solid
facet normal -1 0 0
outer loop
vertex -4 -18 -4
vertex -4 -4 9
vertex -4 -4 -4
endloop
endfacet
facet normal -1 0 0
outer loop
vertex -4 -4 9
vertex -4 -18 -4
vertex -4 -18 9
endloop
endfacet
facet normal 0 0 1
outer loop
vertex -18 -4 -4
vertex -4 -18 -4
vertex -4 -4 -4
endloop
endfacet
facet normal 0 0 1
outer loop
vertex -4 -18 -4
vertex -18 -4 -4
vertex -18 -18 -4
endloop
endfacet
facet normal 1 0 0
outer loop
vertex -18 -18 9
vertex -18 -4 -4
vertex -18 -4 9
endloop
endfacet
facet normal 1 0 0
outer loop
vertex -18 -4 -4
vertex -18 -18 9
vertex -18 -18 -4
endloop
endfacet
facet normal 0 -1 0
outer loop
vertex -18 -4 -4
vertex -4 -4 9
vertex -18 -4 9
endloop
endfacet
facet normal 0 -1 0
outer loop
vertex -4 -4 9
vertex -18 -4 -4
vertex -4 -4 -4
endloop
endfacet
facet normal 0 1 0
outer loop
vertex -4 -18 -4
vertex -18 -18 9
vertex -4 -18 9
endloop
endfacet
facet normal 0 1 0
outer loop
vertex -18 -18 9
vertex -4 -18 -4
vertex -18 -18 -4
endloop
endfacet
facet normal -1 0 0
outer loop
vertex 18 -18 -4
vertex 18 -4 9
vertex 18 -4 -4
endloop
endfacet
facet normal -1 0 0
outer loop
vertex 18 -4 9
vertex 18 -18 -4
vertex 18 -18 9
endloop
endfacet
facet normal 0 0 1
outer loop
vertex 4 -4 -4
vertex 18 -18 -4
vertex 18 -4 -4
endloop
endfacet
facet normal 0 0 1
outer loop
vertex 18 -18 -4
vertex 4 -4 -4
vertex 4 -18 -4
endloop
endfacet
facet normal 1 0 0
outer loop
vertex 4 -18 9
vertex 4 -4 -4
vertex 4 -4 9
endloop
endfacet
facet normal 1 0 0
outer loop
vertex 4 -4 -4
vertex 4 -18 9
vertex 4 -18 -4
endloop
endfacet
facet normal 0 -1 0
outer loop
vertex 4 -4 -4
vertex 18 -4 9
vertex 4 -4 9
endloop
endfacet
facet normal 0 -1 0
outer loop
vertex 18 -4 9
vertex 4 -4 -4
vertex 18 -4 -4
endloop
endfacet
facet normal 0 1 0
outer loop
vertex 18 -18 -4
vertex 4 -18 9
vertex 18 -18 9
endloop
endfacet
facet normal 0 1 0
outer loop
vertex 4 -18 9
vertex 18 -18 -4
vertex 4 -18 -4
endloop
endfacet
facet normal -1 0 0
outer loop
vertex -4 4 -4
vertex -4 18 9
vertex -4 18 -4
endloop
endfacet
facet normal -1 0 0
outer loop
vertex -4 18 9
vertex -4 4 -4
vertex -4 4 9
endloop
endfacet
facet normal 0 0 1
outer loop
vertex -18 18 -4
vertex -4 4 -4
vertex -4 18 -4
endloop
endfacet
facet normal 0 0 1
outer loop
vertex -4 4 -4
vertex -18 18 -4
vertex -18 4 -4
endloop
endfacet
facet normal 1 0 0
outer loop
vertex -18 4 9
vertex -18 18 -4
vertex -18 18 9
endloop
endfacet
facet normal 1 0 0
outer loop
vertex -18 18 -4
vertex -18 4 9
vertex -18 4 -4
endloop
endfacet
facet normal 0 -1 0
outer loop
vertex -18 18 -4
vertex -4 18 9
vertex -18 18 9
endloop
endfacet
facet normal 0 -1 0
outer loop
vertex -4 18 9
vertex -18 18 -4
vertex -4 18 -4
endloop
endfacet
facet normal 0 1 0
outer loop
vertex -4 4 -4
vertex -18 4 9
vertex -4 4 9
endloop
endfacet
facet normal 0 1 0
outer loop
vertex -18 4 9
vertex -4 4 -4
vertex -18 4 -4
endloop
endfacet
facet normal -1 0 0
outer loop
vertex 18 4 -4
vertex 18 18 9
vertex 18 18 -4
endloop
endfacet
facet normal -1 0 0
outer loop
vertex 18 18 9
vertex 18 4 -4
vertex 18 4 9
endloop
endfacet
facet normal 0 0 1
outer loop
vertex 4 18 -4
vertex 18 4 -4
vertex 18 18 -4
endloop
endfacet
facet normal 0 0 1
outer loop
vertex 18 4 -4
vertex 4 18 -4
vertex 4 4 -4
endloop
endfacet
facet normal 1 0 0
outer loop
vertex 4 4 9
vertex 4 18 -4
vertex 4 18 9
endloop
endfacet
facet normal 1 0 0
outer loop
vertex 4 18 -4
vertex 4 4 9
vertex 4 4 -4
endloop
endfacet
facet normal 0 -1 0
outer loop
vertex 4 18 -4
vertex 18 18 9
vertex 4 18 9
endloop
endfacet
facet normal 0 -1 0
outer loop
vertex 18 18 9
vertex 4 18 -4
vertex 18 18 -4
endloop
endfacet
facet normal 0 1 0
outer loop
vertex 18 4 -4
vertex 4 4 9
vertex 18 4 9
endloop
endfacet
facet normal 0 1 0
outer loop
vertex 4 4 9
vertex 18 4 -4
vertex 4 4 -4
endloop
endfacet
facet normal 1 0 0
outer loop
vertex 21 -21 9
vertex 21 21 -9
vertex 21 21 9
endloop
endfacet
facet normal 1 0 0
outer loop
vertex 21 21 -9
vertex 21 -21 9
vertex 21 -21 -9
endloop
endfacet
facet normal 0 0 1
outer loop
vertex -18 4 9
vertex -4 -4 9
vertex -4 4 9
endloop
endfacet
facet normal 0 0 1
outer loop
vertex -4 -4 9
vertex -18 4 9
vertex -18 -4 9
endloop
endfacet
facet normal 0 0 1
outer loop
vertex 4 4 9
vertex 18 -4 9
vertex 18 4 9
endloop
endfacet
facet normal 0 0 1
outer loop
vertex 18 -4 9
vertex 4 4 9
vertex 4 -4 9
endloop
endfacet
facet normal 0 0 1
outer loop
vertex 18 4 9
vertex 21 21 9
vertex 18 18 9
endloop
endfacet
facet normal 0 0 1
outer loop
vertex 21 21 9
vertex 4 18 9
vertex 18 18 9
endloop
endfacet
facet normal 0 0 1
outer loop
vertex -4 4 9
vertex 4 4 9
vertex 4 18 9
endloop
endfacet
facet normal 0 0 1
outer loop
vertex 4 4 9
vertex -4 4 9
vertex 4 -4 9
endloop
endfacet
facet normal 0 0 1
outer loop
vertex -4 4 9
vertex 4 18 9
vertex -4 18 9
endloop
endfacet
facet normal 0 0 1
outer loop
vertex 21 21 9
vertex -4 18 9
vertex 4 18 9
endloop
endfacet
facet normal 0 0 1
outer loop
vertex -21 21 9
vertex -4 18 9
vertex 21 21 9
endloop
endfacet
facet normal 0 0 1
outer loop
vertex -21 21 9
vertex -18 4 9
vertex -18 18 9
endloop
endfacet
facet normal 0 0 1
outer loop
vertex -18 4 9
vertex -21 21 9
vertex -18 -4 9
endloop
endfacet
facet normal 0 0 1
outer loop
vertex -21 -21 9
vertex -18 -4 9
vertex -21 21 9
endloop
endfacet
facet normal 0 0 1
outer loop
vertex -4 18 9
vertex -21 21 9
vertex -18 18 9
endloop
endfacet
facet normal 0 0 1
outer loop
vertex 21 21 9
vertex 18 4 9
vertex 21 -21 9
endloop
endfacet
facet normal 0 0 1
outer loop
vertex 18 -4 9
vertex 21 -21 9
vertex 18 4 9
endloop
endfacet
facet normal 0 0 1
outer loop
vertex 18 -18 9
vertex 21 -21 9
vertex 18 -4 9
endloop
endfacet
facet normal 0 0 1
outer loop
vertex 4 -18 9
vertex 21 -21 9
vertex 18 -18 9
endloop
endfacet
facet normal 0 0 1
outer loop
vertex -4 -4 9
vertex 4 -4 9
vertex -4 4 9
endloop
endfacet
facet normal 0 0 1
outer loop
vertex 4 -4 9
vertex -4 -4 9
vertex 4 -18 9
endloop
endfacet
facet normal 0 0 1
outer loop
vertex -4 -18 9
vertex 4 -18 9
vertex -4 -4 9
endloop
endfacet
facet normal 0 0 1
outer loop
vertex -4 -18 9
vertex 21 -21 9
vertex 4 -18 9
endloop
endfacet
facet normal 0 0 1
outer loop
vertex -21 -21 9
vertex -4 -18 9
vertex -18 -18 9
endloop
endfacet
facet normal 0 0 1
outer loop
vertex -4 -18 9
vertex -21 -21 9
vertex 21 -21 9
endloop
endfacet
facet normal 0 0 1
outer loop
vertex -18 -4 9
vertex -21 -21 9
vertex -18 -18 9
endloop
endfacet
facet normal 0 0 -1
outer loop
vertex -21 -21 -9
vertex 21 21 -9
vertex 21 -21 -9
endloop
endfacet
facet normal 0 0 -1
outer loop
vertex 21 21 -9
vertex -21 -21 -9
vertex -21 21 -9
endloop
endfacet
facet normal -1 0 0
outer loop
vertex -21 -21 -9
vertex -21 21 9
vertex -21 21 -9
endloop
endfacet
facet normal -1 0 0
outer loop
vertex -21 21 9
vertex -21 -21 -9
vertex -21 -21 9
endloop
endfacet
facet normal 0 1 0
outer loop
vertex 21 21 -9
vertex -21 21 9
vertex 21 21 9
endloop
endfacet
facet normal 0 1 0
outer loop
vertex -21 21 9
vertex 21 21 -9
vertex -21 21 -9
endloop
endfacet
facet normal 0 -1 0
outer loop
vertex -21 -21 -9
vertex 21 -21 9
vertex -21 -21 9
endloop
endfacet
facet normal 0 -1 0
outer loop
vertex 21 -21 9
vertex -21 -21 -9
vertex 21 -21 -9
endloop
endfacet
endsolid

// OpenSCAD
$fn = 32;

// ----------------------------------------------------------------------
// Pocket plate 42 x 42 x 18
// 2 x 2 pockets 14 mm square, 13 mm deep
// ----------------------------------------------------------------------

// --- parameters (mm) ---
thickness = 18;  // plate thickness
floor_t = 5;     // material left under each pocket
pocket = 14;     // pocket side length
pitch_x = 22;    // pocket pitch along X
pitch_y = 22;    // pocket pitch along Y
cols = 2;        // pockets per row
rows = 2;        // rows of pockets

// --- derived feature positions (mm) ---
depth = thickness - floor_t;        // = 13   pocket depth, down to the floor
span_x = (cols - 1) * pitch_x;      // = 22   distance between outer pockets
span_y = (rows - 1) * pitch_y;      // = 22   distance between outer pocket rows
origin_x = -span_x / 2;             // = -11   X of the first pocket
origin_y = -span_y / 2;             // = -11   Y of the first pocket
plate = [span_x + pocket + 6, span_y + pocket + 6, thickness];  // = [42, 42, 18]   overall size: pockets plus 3 mm of wall on each side
feature_centers = [
  [origin_x + 0 * pitch_x, origin_y + 0 * pitch_y],
  [origin_x + 1 * pitch_x, origin_y + 0 * pitch_y],
  [origin_x + 0 * pitch_x, origin_y + 1 * pitch_y],
  [origin_x + 1 * pitch_x, origin_y + 1 * pitch_y]
];   // pocket centres, used verbatim by the cutter loop

// plate outline, then one pocket per centre in feature_centers
difference() {
  cube(plate, center = true);
  for (centre = feature_centers)
    translate([centre[0] - pocket / 2, centre[1] - pocket / 2, plate[2] / 2 - depth])
      cube([pocket, pocket, depth + 1]);  // centred on the declared pocket centre
}
